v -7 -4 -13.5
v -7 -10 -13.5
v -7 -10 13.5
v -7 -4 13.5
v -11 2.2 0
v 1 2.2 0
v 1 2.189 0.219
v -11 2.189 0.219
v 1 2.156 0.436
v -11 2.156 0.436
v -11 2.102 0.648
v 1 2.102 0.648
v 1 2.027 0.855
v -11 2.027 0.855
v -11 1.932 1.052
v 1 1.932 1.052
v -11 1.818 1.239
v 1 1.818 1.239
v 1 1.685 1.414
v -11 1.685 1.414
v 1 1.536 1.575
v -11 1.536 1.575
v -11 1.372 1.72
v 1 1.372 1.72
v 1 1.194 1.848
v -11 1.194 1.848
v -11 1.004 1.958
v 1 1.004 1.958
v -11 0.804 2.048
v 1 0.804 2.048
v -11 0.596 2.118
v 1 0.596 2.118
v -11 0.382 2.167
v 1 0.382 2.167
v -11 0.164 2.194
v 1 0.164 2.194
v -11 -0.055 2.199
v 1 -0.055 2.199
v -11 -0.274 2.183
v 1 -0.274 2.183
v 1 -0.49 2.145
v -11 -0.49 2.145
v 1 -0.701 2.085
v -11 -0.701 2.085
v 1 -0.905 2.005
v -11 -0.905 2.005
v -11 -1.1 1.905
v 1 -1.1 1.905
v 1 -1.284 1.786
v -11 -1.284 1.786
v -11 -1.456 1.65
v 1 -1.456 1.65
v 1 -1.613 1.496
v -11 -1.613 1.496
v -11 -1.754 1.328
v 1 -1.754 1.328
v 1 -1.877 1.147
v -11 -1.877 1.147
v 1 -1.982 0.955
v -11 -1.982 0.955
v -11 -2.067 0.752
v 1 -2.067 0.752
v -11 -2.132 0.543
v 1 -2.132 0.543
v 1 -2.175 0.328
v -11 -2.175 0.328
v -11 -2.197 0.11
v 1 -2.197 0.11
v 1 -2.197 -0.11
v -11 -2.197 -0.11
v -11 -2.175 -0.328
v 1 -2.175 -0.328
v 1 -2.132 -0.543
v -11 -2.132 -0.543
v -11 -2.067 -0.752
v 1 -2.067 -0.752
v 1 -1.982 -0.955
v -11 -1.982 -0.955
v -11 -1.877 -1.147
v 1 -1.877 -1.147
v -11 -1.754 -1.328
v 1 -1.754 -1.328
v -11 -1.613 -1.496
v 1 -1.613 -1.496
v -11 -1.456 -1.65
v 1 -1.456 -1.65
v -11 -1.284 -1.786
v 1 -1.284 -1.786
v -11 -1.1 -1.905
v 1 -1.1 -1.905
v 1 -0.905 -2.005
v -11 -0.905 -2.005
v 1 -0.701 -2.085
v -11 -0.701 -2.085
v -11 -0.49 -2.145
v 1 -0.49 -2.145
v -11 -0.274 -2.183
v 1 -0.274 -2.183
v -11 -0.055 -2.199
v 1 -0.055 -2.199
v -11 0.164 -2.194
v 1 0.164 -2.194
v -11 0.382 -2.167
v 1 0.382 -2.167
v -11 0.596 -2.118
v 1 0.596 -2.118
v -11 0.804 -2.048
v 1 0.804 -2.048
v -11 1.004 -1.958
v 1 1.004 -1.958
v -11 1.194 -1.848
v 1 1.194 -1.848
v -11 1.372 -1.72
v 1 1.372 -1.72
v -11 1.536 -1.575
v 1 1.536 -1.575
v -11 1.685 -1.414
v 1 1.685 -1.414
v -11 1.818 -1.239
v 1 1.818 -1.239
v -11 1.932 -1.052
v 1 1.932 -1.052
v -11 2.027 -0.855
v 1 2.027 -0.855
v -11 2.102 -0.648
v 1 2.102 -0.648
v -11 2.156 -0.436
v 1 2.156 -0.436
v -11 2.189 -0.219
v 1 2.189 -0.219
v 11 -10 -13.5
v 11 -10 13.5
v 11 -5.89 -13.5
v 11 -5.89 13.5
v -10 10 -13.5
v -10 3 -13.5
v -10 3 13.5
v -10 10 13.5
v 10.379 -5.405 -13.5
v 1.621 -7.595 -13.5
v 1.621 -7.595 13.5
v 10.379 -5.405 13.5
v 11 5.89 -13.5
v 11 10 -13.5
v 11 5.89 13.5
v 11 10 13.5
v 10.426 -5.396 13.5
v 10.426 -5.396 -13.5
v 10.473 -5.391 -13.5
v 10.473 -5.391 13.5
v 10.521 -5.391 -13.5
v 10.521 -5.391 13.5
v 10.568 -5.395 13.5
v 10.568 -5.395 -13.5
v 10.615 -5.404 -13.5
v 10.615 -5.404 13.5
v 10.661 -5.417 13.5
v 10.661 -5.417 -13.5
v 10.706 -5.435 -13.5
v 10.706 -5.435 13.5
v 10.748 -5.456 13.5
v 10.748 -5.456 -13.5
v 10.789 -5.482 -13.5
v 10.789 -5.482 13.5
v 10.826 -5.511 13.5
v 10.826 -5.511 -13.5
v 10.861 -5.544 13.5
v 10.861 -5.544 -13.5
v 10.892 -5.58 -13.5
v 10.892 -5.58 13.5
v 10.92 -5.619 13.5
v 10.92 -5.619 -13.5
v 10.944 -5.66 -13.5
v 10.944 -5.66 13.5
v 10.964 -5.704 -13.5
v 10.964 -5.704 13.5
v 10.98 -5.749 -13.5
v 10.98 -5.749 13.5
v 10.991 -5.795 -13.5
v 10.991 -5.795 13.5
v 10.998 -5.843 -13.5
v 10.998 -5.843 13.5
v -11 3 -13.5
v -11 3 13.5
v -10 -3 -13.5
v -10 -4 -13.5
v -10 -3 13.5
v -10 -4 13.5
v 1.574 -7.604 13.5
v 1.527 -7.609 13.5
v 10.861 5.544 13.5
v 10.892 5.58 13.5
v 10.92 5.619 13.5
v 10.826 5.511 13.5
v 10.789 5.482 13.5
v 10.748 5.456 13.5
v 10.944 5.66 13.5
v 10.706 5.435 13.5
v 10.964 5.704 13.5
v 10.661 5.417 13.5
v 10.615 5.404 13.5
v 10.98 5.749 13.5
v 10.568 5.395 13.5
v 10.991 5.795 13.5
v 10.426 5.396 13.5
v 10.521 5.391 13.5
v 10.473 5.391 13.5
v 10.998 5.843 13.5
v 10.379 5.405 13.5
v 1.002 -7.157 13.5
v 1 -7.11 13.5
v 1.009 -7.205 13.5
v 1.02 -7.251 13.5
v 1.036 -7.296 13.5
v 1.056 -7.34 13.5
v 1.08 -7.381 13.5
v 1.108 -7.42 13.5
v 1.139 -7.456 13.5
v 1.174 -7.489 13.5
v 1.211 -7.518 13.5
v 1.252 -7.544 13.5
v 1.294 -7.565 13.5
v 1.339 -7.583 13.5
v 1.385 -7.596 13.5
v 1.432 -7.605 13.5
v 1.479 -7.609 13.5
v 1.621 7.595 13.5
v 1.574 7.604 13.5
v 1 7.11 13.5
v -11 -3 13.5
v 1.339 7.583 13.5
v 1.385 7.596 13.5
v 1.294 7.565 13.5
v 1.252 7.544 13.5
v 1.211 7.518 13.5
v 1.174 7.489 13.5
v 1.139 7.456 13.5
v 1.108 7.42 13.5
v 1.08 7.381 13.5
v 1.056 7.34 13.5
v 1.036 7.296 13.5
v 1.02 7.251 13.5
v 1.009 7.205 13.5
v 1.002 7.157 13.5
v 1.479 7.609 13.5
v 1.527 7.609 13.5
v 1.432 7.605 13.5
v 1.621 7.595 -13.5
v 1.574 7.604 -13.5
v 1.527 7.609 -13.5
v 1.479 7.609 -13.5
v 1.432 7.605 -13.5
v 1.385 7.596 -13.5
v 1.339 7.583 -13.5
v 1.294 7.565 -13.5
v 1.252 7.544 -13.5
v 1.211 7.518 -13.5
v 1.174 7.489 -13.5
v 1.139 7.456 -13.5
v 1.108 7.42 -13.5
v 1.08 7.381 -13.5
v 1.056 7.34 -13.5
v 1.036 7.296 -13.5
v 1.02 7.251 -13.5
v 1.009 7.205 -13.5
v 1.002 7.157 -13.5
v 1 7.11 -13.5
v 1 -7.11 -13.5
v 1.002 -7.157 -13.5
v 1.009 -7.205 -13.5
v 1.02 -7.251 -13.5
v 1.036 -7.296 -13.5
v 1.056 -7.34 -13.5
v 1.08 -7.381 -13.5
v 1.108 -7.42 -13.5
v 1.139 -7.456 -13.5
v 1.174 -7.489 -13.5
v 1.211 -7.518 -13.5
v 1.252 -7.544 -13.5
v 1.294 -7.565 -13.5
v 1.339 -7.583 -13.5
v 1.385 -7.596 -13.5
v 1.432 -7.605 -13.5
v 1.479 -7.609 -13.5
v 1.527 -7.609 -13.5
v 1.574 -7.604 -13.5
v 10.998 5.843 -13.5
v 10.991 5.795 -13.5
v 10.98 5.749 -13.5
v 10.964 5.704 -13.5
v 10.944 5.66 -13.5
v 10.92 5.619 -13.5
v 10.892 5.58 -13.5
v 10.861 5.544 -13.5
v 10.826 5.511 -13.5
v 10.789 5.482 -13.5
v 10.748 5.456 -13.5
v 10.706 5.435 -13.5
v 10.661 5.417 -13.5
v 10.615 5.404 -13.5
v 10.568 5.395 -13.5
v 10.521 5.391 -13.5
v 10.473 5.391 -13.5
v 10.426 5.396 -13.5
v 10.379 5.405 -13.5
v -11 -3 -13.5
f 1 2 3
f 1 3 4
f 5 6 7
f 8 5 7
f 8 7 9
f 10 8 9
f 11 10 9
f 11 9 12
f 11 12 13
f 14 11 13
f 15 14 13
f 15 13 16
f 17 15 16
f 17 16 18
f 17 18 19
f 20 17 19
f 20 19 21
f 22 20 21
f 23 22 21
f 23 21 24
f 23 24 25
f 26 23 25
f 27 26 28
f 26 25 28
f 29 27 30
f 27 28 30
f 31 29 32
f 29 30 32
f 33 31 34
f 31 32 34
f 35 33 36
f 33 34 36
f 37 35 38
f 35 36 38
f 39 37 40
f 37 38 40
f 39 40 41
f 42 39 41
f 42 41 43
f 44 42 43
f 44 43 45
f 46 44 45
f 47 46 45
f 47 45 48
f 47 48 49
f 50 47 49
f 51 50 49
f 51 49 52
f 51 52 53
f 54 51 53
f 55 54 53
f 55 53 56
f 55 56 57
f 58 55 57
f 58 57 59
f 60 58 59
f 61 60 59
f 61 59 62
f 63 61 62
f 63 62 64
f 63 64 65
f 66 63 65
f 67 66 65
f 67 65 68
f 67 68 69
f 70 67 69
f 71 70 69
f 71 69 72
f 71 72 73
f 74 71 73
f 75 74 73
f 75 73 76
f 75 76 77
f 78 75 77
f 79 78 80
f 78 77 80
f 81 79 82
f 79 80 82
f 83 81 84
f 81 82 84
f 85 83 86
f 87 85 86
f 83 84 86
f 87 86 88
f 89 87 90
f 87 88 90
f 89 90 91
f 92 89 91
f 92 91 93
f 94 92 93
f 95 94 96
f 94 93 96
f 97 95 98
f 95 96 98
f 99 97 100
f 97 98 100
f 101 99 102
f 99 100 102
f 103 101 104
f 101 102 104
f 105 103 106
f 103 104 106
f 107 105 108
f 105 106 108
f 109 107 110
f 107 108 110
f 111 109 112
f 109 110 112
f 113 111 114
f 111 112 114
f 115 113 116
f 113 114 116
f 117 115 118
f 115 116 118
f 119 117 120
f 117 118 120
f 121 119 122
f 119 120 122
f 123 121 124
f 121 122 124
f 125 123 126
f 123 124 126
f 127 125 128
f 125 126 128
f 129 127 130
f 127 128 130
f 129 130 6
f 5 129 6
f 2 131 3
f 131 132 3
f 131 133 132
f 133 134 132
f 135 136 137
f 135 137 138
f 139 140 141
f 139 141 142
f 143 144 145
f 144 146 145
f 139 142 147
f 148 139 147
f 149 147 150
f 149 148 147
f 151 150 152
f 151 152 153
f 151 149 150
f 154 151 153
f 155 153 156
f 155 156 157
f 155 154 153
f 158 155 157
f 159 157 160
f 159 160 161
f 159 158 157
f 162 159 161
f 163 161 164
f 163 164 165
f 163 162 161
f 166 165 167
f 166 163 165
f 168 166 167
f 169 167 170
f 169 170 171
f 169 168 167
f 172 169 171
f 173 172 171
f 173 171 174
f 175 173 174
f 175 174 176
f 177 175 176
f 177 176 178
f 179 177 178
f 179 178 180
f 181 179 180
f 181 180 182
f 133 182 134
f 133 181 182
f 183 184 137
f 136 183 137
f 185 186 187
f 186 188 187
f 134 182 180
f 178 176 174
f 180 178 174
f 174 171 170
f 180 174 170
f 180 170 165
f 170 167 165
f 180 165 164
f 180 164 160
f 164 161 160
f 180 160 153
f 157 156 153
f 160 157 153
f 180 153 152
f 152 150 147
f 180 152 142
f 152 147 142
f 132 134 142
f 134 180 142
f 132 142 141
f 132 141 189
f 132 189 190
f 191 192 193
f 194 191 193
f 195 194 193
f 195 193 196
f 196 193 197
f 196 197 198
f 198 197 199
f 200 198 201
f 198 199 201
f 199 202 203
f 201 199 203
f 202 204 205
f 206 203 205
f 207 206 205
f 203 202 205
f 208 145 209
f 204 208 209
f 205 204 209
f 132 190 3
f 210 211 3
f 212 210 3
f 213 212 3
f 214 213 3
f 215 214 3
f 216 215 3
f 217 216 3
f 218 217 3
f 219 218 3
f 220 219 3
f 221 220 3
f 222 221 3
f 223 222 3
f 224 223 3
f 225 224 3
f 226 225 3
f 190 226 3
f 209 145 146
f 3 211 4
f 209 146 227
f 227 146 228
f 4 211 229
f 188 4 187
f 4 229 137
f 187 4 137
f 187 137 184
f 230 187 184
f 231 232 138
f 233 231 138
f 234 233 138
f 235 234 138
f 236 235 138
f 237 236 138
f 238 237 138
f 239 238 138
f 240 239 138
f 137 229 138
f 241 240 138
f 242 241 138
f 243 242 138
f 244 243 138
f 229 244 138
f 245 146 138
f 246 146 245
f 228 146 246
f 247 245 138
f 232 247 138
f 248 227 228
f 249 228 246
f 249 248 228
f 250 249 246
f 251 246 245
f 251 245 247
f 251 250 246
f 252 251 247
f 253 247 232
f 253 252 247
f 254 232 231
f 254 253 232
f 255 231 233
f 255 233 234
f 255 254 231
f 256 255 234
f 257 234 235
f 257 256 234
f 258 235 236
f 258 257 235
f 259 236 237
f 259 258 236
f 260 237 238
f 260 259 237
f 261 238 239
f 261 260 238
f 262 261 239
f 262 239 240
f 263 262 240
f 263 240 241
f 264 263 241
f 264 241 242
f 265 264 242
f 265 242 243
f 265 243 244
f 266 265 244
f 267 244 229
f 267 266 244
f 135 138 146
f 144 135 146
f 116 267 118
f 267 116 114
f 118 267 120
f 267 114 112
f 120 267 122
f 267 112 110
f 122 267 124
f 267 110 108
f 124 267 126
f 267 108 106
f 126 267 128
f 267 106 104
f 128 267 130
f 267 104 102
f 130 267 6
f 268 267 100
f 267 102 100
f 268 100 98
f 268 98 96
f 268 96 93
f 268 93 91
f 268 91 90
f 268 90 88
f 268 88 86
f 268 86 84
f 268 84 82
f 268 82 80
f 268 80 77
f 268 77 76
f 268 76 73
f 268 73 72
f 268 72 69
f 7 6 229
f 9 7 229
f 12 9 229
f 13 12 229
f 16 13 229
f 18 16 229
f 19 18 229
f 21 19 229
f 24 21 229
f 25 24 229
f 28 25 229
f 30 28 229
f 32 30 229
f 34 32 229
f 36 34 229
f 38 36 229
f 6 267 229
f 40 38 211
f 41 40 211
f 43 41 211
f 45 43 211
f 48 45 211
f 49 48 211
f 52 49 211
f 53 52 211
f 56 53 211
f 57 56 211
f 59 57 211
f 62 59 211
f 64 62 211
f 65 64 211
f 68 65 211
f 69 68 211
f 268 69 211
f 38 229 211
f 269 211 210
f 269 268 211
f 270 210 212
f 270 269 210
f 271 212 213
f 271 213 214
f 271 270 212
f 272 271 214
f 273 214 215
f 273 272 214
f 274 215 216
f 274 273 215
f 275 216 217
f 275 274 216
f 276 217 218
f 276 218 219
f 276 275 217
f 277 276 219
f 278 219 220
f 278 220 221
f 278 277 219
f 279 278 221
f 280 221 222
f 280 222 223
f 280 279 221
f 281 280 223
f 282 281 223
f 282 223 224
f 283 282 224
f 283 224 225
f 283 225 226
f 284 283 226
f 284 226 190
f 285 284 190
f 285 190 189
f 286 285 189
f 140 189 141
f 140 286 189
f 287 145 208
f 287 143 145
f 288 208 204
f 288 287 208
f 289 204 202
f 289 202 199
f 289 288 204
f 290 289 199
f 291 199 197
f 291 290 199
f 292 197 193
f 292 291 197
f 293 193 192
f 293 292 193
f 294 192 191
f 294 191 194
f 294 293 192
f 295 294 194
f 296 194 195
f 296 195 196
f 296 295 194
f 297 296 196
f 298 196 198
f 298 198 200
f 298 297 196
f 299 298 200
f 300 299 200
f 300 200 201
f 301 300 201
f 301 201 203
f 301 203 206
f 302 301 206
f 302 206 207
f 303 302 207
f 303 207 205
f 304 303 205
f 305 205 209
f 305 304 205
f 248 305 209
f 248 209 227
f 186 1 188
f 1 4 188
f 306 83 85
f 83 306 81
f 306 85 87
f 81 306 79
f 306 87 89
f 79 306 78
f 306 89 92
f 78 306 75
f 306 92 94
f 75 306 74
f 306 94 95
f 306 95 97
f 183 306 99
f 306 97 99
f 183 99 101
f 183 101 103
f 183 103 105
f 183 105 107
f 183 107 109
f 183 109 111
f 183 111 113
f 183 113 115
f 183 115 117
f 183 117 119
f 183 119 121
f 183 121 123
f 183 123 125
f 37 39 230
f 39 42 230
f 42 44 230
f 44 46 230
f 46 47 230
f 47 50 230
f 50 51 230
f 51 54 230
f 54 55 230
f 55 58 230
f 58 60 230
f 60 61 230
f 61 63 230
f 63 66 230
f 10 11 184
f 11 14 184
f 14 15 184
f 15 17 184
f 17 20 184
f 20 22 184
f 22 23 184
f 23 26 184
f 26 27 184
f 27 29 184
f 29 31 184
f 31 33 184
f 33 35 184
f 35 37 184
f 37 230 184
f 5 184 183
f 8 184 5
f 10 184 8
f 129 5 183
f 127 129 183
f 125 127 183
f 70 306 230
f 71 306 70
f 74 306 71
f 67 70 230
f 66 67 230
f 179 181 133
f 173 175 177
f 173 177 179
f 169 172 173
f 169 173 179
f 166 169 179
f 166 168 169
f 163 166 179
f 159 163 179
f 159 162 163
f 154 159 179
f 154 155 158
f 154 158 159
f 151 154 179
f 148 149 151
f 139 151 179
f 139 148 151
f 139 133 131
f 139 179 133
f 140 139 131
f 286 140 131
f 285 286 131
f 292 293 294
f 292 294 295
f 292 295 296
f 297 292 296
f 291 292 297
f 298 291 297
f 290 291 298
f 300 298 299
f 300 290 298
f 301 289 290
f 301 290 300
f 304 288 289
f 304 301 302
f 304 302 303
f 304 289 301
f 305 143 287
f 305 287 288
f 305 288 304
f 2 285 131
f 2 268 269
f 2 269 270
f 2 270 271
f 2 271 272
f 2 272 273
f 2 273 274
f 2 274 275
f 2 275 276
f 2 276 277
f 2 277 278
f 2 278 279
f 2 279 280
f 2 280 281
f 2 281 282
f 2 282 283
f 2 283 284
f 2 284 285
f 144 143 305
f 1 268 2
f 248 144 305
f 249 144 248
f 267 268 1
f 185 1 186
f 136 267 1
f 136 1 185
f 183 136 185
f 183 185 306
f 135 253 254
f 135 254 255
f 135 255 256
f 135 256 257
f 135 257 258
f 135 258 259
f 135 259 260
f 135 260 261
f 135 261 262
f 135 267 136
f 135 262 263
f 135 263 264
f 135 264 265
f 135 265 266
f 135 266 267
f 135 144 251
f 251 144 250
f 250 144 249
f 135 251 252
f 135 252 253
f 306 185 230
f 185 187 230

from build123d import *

# Parameters (mm, degrees)
PAD_DEPTH    = 13.5
SKETCH001_R  = 2.2
POCKET_DEPTH = 12.001
FILLET001_R  = 0.5


with BuildPart() as part:
    # Sketch → Pad (new body, symmetric)
    with BuildSketch(Plane.XY):
        Polygon((-10, 10), (11, 10), (11, 5.25), (1, 7.75), (1, -7.75), (11, -5.25), (11, -10), (-7, -10), (-7, -4), (-10, -4), (-10, -3), (-11, -3), (-11, 3), (-10, 3), align=None)
    extrude(amount=PAD_DEPTH, both=True)

    # Sketch001 (on Face6 of Pad) → Pocket (cut, through all)
    with BuildSketch(Plane.YZ.offset(1)):
        Circle(SKETCH001_R)
    extrude(amount=-POCKET_DEPTH, mode=Mode.SUBTRACT)

    # Fillet001
    fillet001_edges = [part.edges().sort_by_distance(p)[0] for p in [
        (1, 7.75, 0),
        (1, -7.75, 0),
        (11, -5.25, 0),
        (11, 5.25, 0),
    ]]
    fillet(fillet001_edges, radius=FILLET001_R)


solid = part.part
